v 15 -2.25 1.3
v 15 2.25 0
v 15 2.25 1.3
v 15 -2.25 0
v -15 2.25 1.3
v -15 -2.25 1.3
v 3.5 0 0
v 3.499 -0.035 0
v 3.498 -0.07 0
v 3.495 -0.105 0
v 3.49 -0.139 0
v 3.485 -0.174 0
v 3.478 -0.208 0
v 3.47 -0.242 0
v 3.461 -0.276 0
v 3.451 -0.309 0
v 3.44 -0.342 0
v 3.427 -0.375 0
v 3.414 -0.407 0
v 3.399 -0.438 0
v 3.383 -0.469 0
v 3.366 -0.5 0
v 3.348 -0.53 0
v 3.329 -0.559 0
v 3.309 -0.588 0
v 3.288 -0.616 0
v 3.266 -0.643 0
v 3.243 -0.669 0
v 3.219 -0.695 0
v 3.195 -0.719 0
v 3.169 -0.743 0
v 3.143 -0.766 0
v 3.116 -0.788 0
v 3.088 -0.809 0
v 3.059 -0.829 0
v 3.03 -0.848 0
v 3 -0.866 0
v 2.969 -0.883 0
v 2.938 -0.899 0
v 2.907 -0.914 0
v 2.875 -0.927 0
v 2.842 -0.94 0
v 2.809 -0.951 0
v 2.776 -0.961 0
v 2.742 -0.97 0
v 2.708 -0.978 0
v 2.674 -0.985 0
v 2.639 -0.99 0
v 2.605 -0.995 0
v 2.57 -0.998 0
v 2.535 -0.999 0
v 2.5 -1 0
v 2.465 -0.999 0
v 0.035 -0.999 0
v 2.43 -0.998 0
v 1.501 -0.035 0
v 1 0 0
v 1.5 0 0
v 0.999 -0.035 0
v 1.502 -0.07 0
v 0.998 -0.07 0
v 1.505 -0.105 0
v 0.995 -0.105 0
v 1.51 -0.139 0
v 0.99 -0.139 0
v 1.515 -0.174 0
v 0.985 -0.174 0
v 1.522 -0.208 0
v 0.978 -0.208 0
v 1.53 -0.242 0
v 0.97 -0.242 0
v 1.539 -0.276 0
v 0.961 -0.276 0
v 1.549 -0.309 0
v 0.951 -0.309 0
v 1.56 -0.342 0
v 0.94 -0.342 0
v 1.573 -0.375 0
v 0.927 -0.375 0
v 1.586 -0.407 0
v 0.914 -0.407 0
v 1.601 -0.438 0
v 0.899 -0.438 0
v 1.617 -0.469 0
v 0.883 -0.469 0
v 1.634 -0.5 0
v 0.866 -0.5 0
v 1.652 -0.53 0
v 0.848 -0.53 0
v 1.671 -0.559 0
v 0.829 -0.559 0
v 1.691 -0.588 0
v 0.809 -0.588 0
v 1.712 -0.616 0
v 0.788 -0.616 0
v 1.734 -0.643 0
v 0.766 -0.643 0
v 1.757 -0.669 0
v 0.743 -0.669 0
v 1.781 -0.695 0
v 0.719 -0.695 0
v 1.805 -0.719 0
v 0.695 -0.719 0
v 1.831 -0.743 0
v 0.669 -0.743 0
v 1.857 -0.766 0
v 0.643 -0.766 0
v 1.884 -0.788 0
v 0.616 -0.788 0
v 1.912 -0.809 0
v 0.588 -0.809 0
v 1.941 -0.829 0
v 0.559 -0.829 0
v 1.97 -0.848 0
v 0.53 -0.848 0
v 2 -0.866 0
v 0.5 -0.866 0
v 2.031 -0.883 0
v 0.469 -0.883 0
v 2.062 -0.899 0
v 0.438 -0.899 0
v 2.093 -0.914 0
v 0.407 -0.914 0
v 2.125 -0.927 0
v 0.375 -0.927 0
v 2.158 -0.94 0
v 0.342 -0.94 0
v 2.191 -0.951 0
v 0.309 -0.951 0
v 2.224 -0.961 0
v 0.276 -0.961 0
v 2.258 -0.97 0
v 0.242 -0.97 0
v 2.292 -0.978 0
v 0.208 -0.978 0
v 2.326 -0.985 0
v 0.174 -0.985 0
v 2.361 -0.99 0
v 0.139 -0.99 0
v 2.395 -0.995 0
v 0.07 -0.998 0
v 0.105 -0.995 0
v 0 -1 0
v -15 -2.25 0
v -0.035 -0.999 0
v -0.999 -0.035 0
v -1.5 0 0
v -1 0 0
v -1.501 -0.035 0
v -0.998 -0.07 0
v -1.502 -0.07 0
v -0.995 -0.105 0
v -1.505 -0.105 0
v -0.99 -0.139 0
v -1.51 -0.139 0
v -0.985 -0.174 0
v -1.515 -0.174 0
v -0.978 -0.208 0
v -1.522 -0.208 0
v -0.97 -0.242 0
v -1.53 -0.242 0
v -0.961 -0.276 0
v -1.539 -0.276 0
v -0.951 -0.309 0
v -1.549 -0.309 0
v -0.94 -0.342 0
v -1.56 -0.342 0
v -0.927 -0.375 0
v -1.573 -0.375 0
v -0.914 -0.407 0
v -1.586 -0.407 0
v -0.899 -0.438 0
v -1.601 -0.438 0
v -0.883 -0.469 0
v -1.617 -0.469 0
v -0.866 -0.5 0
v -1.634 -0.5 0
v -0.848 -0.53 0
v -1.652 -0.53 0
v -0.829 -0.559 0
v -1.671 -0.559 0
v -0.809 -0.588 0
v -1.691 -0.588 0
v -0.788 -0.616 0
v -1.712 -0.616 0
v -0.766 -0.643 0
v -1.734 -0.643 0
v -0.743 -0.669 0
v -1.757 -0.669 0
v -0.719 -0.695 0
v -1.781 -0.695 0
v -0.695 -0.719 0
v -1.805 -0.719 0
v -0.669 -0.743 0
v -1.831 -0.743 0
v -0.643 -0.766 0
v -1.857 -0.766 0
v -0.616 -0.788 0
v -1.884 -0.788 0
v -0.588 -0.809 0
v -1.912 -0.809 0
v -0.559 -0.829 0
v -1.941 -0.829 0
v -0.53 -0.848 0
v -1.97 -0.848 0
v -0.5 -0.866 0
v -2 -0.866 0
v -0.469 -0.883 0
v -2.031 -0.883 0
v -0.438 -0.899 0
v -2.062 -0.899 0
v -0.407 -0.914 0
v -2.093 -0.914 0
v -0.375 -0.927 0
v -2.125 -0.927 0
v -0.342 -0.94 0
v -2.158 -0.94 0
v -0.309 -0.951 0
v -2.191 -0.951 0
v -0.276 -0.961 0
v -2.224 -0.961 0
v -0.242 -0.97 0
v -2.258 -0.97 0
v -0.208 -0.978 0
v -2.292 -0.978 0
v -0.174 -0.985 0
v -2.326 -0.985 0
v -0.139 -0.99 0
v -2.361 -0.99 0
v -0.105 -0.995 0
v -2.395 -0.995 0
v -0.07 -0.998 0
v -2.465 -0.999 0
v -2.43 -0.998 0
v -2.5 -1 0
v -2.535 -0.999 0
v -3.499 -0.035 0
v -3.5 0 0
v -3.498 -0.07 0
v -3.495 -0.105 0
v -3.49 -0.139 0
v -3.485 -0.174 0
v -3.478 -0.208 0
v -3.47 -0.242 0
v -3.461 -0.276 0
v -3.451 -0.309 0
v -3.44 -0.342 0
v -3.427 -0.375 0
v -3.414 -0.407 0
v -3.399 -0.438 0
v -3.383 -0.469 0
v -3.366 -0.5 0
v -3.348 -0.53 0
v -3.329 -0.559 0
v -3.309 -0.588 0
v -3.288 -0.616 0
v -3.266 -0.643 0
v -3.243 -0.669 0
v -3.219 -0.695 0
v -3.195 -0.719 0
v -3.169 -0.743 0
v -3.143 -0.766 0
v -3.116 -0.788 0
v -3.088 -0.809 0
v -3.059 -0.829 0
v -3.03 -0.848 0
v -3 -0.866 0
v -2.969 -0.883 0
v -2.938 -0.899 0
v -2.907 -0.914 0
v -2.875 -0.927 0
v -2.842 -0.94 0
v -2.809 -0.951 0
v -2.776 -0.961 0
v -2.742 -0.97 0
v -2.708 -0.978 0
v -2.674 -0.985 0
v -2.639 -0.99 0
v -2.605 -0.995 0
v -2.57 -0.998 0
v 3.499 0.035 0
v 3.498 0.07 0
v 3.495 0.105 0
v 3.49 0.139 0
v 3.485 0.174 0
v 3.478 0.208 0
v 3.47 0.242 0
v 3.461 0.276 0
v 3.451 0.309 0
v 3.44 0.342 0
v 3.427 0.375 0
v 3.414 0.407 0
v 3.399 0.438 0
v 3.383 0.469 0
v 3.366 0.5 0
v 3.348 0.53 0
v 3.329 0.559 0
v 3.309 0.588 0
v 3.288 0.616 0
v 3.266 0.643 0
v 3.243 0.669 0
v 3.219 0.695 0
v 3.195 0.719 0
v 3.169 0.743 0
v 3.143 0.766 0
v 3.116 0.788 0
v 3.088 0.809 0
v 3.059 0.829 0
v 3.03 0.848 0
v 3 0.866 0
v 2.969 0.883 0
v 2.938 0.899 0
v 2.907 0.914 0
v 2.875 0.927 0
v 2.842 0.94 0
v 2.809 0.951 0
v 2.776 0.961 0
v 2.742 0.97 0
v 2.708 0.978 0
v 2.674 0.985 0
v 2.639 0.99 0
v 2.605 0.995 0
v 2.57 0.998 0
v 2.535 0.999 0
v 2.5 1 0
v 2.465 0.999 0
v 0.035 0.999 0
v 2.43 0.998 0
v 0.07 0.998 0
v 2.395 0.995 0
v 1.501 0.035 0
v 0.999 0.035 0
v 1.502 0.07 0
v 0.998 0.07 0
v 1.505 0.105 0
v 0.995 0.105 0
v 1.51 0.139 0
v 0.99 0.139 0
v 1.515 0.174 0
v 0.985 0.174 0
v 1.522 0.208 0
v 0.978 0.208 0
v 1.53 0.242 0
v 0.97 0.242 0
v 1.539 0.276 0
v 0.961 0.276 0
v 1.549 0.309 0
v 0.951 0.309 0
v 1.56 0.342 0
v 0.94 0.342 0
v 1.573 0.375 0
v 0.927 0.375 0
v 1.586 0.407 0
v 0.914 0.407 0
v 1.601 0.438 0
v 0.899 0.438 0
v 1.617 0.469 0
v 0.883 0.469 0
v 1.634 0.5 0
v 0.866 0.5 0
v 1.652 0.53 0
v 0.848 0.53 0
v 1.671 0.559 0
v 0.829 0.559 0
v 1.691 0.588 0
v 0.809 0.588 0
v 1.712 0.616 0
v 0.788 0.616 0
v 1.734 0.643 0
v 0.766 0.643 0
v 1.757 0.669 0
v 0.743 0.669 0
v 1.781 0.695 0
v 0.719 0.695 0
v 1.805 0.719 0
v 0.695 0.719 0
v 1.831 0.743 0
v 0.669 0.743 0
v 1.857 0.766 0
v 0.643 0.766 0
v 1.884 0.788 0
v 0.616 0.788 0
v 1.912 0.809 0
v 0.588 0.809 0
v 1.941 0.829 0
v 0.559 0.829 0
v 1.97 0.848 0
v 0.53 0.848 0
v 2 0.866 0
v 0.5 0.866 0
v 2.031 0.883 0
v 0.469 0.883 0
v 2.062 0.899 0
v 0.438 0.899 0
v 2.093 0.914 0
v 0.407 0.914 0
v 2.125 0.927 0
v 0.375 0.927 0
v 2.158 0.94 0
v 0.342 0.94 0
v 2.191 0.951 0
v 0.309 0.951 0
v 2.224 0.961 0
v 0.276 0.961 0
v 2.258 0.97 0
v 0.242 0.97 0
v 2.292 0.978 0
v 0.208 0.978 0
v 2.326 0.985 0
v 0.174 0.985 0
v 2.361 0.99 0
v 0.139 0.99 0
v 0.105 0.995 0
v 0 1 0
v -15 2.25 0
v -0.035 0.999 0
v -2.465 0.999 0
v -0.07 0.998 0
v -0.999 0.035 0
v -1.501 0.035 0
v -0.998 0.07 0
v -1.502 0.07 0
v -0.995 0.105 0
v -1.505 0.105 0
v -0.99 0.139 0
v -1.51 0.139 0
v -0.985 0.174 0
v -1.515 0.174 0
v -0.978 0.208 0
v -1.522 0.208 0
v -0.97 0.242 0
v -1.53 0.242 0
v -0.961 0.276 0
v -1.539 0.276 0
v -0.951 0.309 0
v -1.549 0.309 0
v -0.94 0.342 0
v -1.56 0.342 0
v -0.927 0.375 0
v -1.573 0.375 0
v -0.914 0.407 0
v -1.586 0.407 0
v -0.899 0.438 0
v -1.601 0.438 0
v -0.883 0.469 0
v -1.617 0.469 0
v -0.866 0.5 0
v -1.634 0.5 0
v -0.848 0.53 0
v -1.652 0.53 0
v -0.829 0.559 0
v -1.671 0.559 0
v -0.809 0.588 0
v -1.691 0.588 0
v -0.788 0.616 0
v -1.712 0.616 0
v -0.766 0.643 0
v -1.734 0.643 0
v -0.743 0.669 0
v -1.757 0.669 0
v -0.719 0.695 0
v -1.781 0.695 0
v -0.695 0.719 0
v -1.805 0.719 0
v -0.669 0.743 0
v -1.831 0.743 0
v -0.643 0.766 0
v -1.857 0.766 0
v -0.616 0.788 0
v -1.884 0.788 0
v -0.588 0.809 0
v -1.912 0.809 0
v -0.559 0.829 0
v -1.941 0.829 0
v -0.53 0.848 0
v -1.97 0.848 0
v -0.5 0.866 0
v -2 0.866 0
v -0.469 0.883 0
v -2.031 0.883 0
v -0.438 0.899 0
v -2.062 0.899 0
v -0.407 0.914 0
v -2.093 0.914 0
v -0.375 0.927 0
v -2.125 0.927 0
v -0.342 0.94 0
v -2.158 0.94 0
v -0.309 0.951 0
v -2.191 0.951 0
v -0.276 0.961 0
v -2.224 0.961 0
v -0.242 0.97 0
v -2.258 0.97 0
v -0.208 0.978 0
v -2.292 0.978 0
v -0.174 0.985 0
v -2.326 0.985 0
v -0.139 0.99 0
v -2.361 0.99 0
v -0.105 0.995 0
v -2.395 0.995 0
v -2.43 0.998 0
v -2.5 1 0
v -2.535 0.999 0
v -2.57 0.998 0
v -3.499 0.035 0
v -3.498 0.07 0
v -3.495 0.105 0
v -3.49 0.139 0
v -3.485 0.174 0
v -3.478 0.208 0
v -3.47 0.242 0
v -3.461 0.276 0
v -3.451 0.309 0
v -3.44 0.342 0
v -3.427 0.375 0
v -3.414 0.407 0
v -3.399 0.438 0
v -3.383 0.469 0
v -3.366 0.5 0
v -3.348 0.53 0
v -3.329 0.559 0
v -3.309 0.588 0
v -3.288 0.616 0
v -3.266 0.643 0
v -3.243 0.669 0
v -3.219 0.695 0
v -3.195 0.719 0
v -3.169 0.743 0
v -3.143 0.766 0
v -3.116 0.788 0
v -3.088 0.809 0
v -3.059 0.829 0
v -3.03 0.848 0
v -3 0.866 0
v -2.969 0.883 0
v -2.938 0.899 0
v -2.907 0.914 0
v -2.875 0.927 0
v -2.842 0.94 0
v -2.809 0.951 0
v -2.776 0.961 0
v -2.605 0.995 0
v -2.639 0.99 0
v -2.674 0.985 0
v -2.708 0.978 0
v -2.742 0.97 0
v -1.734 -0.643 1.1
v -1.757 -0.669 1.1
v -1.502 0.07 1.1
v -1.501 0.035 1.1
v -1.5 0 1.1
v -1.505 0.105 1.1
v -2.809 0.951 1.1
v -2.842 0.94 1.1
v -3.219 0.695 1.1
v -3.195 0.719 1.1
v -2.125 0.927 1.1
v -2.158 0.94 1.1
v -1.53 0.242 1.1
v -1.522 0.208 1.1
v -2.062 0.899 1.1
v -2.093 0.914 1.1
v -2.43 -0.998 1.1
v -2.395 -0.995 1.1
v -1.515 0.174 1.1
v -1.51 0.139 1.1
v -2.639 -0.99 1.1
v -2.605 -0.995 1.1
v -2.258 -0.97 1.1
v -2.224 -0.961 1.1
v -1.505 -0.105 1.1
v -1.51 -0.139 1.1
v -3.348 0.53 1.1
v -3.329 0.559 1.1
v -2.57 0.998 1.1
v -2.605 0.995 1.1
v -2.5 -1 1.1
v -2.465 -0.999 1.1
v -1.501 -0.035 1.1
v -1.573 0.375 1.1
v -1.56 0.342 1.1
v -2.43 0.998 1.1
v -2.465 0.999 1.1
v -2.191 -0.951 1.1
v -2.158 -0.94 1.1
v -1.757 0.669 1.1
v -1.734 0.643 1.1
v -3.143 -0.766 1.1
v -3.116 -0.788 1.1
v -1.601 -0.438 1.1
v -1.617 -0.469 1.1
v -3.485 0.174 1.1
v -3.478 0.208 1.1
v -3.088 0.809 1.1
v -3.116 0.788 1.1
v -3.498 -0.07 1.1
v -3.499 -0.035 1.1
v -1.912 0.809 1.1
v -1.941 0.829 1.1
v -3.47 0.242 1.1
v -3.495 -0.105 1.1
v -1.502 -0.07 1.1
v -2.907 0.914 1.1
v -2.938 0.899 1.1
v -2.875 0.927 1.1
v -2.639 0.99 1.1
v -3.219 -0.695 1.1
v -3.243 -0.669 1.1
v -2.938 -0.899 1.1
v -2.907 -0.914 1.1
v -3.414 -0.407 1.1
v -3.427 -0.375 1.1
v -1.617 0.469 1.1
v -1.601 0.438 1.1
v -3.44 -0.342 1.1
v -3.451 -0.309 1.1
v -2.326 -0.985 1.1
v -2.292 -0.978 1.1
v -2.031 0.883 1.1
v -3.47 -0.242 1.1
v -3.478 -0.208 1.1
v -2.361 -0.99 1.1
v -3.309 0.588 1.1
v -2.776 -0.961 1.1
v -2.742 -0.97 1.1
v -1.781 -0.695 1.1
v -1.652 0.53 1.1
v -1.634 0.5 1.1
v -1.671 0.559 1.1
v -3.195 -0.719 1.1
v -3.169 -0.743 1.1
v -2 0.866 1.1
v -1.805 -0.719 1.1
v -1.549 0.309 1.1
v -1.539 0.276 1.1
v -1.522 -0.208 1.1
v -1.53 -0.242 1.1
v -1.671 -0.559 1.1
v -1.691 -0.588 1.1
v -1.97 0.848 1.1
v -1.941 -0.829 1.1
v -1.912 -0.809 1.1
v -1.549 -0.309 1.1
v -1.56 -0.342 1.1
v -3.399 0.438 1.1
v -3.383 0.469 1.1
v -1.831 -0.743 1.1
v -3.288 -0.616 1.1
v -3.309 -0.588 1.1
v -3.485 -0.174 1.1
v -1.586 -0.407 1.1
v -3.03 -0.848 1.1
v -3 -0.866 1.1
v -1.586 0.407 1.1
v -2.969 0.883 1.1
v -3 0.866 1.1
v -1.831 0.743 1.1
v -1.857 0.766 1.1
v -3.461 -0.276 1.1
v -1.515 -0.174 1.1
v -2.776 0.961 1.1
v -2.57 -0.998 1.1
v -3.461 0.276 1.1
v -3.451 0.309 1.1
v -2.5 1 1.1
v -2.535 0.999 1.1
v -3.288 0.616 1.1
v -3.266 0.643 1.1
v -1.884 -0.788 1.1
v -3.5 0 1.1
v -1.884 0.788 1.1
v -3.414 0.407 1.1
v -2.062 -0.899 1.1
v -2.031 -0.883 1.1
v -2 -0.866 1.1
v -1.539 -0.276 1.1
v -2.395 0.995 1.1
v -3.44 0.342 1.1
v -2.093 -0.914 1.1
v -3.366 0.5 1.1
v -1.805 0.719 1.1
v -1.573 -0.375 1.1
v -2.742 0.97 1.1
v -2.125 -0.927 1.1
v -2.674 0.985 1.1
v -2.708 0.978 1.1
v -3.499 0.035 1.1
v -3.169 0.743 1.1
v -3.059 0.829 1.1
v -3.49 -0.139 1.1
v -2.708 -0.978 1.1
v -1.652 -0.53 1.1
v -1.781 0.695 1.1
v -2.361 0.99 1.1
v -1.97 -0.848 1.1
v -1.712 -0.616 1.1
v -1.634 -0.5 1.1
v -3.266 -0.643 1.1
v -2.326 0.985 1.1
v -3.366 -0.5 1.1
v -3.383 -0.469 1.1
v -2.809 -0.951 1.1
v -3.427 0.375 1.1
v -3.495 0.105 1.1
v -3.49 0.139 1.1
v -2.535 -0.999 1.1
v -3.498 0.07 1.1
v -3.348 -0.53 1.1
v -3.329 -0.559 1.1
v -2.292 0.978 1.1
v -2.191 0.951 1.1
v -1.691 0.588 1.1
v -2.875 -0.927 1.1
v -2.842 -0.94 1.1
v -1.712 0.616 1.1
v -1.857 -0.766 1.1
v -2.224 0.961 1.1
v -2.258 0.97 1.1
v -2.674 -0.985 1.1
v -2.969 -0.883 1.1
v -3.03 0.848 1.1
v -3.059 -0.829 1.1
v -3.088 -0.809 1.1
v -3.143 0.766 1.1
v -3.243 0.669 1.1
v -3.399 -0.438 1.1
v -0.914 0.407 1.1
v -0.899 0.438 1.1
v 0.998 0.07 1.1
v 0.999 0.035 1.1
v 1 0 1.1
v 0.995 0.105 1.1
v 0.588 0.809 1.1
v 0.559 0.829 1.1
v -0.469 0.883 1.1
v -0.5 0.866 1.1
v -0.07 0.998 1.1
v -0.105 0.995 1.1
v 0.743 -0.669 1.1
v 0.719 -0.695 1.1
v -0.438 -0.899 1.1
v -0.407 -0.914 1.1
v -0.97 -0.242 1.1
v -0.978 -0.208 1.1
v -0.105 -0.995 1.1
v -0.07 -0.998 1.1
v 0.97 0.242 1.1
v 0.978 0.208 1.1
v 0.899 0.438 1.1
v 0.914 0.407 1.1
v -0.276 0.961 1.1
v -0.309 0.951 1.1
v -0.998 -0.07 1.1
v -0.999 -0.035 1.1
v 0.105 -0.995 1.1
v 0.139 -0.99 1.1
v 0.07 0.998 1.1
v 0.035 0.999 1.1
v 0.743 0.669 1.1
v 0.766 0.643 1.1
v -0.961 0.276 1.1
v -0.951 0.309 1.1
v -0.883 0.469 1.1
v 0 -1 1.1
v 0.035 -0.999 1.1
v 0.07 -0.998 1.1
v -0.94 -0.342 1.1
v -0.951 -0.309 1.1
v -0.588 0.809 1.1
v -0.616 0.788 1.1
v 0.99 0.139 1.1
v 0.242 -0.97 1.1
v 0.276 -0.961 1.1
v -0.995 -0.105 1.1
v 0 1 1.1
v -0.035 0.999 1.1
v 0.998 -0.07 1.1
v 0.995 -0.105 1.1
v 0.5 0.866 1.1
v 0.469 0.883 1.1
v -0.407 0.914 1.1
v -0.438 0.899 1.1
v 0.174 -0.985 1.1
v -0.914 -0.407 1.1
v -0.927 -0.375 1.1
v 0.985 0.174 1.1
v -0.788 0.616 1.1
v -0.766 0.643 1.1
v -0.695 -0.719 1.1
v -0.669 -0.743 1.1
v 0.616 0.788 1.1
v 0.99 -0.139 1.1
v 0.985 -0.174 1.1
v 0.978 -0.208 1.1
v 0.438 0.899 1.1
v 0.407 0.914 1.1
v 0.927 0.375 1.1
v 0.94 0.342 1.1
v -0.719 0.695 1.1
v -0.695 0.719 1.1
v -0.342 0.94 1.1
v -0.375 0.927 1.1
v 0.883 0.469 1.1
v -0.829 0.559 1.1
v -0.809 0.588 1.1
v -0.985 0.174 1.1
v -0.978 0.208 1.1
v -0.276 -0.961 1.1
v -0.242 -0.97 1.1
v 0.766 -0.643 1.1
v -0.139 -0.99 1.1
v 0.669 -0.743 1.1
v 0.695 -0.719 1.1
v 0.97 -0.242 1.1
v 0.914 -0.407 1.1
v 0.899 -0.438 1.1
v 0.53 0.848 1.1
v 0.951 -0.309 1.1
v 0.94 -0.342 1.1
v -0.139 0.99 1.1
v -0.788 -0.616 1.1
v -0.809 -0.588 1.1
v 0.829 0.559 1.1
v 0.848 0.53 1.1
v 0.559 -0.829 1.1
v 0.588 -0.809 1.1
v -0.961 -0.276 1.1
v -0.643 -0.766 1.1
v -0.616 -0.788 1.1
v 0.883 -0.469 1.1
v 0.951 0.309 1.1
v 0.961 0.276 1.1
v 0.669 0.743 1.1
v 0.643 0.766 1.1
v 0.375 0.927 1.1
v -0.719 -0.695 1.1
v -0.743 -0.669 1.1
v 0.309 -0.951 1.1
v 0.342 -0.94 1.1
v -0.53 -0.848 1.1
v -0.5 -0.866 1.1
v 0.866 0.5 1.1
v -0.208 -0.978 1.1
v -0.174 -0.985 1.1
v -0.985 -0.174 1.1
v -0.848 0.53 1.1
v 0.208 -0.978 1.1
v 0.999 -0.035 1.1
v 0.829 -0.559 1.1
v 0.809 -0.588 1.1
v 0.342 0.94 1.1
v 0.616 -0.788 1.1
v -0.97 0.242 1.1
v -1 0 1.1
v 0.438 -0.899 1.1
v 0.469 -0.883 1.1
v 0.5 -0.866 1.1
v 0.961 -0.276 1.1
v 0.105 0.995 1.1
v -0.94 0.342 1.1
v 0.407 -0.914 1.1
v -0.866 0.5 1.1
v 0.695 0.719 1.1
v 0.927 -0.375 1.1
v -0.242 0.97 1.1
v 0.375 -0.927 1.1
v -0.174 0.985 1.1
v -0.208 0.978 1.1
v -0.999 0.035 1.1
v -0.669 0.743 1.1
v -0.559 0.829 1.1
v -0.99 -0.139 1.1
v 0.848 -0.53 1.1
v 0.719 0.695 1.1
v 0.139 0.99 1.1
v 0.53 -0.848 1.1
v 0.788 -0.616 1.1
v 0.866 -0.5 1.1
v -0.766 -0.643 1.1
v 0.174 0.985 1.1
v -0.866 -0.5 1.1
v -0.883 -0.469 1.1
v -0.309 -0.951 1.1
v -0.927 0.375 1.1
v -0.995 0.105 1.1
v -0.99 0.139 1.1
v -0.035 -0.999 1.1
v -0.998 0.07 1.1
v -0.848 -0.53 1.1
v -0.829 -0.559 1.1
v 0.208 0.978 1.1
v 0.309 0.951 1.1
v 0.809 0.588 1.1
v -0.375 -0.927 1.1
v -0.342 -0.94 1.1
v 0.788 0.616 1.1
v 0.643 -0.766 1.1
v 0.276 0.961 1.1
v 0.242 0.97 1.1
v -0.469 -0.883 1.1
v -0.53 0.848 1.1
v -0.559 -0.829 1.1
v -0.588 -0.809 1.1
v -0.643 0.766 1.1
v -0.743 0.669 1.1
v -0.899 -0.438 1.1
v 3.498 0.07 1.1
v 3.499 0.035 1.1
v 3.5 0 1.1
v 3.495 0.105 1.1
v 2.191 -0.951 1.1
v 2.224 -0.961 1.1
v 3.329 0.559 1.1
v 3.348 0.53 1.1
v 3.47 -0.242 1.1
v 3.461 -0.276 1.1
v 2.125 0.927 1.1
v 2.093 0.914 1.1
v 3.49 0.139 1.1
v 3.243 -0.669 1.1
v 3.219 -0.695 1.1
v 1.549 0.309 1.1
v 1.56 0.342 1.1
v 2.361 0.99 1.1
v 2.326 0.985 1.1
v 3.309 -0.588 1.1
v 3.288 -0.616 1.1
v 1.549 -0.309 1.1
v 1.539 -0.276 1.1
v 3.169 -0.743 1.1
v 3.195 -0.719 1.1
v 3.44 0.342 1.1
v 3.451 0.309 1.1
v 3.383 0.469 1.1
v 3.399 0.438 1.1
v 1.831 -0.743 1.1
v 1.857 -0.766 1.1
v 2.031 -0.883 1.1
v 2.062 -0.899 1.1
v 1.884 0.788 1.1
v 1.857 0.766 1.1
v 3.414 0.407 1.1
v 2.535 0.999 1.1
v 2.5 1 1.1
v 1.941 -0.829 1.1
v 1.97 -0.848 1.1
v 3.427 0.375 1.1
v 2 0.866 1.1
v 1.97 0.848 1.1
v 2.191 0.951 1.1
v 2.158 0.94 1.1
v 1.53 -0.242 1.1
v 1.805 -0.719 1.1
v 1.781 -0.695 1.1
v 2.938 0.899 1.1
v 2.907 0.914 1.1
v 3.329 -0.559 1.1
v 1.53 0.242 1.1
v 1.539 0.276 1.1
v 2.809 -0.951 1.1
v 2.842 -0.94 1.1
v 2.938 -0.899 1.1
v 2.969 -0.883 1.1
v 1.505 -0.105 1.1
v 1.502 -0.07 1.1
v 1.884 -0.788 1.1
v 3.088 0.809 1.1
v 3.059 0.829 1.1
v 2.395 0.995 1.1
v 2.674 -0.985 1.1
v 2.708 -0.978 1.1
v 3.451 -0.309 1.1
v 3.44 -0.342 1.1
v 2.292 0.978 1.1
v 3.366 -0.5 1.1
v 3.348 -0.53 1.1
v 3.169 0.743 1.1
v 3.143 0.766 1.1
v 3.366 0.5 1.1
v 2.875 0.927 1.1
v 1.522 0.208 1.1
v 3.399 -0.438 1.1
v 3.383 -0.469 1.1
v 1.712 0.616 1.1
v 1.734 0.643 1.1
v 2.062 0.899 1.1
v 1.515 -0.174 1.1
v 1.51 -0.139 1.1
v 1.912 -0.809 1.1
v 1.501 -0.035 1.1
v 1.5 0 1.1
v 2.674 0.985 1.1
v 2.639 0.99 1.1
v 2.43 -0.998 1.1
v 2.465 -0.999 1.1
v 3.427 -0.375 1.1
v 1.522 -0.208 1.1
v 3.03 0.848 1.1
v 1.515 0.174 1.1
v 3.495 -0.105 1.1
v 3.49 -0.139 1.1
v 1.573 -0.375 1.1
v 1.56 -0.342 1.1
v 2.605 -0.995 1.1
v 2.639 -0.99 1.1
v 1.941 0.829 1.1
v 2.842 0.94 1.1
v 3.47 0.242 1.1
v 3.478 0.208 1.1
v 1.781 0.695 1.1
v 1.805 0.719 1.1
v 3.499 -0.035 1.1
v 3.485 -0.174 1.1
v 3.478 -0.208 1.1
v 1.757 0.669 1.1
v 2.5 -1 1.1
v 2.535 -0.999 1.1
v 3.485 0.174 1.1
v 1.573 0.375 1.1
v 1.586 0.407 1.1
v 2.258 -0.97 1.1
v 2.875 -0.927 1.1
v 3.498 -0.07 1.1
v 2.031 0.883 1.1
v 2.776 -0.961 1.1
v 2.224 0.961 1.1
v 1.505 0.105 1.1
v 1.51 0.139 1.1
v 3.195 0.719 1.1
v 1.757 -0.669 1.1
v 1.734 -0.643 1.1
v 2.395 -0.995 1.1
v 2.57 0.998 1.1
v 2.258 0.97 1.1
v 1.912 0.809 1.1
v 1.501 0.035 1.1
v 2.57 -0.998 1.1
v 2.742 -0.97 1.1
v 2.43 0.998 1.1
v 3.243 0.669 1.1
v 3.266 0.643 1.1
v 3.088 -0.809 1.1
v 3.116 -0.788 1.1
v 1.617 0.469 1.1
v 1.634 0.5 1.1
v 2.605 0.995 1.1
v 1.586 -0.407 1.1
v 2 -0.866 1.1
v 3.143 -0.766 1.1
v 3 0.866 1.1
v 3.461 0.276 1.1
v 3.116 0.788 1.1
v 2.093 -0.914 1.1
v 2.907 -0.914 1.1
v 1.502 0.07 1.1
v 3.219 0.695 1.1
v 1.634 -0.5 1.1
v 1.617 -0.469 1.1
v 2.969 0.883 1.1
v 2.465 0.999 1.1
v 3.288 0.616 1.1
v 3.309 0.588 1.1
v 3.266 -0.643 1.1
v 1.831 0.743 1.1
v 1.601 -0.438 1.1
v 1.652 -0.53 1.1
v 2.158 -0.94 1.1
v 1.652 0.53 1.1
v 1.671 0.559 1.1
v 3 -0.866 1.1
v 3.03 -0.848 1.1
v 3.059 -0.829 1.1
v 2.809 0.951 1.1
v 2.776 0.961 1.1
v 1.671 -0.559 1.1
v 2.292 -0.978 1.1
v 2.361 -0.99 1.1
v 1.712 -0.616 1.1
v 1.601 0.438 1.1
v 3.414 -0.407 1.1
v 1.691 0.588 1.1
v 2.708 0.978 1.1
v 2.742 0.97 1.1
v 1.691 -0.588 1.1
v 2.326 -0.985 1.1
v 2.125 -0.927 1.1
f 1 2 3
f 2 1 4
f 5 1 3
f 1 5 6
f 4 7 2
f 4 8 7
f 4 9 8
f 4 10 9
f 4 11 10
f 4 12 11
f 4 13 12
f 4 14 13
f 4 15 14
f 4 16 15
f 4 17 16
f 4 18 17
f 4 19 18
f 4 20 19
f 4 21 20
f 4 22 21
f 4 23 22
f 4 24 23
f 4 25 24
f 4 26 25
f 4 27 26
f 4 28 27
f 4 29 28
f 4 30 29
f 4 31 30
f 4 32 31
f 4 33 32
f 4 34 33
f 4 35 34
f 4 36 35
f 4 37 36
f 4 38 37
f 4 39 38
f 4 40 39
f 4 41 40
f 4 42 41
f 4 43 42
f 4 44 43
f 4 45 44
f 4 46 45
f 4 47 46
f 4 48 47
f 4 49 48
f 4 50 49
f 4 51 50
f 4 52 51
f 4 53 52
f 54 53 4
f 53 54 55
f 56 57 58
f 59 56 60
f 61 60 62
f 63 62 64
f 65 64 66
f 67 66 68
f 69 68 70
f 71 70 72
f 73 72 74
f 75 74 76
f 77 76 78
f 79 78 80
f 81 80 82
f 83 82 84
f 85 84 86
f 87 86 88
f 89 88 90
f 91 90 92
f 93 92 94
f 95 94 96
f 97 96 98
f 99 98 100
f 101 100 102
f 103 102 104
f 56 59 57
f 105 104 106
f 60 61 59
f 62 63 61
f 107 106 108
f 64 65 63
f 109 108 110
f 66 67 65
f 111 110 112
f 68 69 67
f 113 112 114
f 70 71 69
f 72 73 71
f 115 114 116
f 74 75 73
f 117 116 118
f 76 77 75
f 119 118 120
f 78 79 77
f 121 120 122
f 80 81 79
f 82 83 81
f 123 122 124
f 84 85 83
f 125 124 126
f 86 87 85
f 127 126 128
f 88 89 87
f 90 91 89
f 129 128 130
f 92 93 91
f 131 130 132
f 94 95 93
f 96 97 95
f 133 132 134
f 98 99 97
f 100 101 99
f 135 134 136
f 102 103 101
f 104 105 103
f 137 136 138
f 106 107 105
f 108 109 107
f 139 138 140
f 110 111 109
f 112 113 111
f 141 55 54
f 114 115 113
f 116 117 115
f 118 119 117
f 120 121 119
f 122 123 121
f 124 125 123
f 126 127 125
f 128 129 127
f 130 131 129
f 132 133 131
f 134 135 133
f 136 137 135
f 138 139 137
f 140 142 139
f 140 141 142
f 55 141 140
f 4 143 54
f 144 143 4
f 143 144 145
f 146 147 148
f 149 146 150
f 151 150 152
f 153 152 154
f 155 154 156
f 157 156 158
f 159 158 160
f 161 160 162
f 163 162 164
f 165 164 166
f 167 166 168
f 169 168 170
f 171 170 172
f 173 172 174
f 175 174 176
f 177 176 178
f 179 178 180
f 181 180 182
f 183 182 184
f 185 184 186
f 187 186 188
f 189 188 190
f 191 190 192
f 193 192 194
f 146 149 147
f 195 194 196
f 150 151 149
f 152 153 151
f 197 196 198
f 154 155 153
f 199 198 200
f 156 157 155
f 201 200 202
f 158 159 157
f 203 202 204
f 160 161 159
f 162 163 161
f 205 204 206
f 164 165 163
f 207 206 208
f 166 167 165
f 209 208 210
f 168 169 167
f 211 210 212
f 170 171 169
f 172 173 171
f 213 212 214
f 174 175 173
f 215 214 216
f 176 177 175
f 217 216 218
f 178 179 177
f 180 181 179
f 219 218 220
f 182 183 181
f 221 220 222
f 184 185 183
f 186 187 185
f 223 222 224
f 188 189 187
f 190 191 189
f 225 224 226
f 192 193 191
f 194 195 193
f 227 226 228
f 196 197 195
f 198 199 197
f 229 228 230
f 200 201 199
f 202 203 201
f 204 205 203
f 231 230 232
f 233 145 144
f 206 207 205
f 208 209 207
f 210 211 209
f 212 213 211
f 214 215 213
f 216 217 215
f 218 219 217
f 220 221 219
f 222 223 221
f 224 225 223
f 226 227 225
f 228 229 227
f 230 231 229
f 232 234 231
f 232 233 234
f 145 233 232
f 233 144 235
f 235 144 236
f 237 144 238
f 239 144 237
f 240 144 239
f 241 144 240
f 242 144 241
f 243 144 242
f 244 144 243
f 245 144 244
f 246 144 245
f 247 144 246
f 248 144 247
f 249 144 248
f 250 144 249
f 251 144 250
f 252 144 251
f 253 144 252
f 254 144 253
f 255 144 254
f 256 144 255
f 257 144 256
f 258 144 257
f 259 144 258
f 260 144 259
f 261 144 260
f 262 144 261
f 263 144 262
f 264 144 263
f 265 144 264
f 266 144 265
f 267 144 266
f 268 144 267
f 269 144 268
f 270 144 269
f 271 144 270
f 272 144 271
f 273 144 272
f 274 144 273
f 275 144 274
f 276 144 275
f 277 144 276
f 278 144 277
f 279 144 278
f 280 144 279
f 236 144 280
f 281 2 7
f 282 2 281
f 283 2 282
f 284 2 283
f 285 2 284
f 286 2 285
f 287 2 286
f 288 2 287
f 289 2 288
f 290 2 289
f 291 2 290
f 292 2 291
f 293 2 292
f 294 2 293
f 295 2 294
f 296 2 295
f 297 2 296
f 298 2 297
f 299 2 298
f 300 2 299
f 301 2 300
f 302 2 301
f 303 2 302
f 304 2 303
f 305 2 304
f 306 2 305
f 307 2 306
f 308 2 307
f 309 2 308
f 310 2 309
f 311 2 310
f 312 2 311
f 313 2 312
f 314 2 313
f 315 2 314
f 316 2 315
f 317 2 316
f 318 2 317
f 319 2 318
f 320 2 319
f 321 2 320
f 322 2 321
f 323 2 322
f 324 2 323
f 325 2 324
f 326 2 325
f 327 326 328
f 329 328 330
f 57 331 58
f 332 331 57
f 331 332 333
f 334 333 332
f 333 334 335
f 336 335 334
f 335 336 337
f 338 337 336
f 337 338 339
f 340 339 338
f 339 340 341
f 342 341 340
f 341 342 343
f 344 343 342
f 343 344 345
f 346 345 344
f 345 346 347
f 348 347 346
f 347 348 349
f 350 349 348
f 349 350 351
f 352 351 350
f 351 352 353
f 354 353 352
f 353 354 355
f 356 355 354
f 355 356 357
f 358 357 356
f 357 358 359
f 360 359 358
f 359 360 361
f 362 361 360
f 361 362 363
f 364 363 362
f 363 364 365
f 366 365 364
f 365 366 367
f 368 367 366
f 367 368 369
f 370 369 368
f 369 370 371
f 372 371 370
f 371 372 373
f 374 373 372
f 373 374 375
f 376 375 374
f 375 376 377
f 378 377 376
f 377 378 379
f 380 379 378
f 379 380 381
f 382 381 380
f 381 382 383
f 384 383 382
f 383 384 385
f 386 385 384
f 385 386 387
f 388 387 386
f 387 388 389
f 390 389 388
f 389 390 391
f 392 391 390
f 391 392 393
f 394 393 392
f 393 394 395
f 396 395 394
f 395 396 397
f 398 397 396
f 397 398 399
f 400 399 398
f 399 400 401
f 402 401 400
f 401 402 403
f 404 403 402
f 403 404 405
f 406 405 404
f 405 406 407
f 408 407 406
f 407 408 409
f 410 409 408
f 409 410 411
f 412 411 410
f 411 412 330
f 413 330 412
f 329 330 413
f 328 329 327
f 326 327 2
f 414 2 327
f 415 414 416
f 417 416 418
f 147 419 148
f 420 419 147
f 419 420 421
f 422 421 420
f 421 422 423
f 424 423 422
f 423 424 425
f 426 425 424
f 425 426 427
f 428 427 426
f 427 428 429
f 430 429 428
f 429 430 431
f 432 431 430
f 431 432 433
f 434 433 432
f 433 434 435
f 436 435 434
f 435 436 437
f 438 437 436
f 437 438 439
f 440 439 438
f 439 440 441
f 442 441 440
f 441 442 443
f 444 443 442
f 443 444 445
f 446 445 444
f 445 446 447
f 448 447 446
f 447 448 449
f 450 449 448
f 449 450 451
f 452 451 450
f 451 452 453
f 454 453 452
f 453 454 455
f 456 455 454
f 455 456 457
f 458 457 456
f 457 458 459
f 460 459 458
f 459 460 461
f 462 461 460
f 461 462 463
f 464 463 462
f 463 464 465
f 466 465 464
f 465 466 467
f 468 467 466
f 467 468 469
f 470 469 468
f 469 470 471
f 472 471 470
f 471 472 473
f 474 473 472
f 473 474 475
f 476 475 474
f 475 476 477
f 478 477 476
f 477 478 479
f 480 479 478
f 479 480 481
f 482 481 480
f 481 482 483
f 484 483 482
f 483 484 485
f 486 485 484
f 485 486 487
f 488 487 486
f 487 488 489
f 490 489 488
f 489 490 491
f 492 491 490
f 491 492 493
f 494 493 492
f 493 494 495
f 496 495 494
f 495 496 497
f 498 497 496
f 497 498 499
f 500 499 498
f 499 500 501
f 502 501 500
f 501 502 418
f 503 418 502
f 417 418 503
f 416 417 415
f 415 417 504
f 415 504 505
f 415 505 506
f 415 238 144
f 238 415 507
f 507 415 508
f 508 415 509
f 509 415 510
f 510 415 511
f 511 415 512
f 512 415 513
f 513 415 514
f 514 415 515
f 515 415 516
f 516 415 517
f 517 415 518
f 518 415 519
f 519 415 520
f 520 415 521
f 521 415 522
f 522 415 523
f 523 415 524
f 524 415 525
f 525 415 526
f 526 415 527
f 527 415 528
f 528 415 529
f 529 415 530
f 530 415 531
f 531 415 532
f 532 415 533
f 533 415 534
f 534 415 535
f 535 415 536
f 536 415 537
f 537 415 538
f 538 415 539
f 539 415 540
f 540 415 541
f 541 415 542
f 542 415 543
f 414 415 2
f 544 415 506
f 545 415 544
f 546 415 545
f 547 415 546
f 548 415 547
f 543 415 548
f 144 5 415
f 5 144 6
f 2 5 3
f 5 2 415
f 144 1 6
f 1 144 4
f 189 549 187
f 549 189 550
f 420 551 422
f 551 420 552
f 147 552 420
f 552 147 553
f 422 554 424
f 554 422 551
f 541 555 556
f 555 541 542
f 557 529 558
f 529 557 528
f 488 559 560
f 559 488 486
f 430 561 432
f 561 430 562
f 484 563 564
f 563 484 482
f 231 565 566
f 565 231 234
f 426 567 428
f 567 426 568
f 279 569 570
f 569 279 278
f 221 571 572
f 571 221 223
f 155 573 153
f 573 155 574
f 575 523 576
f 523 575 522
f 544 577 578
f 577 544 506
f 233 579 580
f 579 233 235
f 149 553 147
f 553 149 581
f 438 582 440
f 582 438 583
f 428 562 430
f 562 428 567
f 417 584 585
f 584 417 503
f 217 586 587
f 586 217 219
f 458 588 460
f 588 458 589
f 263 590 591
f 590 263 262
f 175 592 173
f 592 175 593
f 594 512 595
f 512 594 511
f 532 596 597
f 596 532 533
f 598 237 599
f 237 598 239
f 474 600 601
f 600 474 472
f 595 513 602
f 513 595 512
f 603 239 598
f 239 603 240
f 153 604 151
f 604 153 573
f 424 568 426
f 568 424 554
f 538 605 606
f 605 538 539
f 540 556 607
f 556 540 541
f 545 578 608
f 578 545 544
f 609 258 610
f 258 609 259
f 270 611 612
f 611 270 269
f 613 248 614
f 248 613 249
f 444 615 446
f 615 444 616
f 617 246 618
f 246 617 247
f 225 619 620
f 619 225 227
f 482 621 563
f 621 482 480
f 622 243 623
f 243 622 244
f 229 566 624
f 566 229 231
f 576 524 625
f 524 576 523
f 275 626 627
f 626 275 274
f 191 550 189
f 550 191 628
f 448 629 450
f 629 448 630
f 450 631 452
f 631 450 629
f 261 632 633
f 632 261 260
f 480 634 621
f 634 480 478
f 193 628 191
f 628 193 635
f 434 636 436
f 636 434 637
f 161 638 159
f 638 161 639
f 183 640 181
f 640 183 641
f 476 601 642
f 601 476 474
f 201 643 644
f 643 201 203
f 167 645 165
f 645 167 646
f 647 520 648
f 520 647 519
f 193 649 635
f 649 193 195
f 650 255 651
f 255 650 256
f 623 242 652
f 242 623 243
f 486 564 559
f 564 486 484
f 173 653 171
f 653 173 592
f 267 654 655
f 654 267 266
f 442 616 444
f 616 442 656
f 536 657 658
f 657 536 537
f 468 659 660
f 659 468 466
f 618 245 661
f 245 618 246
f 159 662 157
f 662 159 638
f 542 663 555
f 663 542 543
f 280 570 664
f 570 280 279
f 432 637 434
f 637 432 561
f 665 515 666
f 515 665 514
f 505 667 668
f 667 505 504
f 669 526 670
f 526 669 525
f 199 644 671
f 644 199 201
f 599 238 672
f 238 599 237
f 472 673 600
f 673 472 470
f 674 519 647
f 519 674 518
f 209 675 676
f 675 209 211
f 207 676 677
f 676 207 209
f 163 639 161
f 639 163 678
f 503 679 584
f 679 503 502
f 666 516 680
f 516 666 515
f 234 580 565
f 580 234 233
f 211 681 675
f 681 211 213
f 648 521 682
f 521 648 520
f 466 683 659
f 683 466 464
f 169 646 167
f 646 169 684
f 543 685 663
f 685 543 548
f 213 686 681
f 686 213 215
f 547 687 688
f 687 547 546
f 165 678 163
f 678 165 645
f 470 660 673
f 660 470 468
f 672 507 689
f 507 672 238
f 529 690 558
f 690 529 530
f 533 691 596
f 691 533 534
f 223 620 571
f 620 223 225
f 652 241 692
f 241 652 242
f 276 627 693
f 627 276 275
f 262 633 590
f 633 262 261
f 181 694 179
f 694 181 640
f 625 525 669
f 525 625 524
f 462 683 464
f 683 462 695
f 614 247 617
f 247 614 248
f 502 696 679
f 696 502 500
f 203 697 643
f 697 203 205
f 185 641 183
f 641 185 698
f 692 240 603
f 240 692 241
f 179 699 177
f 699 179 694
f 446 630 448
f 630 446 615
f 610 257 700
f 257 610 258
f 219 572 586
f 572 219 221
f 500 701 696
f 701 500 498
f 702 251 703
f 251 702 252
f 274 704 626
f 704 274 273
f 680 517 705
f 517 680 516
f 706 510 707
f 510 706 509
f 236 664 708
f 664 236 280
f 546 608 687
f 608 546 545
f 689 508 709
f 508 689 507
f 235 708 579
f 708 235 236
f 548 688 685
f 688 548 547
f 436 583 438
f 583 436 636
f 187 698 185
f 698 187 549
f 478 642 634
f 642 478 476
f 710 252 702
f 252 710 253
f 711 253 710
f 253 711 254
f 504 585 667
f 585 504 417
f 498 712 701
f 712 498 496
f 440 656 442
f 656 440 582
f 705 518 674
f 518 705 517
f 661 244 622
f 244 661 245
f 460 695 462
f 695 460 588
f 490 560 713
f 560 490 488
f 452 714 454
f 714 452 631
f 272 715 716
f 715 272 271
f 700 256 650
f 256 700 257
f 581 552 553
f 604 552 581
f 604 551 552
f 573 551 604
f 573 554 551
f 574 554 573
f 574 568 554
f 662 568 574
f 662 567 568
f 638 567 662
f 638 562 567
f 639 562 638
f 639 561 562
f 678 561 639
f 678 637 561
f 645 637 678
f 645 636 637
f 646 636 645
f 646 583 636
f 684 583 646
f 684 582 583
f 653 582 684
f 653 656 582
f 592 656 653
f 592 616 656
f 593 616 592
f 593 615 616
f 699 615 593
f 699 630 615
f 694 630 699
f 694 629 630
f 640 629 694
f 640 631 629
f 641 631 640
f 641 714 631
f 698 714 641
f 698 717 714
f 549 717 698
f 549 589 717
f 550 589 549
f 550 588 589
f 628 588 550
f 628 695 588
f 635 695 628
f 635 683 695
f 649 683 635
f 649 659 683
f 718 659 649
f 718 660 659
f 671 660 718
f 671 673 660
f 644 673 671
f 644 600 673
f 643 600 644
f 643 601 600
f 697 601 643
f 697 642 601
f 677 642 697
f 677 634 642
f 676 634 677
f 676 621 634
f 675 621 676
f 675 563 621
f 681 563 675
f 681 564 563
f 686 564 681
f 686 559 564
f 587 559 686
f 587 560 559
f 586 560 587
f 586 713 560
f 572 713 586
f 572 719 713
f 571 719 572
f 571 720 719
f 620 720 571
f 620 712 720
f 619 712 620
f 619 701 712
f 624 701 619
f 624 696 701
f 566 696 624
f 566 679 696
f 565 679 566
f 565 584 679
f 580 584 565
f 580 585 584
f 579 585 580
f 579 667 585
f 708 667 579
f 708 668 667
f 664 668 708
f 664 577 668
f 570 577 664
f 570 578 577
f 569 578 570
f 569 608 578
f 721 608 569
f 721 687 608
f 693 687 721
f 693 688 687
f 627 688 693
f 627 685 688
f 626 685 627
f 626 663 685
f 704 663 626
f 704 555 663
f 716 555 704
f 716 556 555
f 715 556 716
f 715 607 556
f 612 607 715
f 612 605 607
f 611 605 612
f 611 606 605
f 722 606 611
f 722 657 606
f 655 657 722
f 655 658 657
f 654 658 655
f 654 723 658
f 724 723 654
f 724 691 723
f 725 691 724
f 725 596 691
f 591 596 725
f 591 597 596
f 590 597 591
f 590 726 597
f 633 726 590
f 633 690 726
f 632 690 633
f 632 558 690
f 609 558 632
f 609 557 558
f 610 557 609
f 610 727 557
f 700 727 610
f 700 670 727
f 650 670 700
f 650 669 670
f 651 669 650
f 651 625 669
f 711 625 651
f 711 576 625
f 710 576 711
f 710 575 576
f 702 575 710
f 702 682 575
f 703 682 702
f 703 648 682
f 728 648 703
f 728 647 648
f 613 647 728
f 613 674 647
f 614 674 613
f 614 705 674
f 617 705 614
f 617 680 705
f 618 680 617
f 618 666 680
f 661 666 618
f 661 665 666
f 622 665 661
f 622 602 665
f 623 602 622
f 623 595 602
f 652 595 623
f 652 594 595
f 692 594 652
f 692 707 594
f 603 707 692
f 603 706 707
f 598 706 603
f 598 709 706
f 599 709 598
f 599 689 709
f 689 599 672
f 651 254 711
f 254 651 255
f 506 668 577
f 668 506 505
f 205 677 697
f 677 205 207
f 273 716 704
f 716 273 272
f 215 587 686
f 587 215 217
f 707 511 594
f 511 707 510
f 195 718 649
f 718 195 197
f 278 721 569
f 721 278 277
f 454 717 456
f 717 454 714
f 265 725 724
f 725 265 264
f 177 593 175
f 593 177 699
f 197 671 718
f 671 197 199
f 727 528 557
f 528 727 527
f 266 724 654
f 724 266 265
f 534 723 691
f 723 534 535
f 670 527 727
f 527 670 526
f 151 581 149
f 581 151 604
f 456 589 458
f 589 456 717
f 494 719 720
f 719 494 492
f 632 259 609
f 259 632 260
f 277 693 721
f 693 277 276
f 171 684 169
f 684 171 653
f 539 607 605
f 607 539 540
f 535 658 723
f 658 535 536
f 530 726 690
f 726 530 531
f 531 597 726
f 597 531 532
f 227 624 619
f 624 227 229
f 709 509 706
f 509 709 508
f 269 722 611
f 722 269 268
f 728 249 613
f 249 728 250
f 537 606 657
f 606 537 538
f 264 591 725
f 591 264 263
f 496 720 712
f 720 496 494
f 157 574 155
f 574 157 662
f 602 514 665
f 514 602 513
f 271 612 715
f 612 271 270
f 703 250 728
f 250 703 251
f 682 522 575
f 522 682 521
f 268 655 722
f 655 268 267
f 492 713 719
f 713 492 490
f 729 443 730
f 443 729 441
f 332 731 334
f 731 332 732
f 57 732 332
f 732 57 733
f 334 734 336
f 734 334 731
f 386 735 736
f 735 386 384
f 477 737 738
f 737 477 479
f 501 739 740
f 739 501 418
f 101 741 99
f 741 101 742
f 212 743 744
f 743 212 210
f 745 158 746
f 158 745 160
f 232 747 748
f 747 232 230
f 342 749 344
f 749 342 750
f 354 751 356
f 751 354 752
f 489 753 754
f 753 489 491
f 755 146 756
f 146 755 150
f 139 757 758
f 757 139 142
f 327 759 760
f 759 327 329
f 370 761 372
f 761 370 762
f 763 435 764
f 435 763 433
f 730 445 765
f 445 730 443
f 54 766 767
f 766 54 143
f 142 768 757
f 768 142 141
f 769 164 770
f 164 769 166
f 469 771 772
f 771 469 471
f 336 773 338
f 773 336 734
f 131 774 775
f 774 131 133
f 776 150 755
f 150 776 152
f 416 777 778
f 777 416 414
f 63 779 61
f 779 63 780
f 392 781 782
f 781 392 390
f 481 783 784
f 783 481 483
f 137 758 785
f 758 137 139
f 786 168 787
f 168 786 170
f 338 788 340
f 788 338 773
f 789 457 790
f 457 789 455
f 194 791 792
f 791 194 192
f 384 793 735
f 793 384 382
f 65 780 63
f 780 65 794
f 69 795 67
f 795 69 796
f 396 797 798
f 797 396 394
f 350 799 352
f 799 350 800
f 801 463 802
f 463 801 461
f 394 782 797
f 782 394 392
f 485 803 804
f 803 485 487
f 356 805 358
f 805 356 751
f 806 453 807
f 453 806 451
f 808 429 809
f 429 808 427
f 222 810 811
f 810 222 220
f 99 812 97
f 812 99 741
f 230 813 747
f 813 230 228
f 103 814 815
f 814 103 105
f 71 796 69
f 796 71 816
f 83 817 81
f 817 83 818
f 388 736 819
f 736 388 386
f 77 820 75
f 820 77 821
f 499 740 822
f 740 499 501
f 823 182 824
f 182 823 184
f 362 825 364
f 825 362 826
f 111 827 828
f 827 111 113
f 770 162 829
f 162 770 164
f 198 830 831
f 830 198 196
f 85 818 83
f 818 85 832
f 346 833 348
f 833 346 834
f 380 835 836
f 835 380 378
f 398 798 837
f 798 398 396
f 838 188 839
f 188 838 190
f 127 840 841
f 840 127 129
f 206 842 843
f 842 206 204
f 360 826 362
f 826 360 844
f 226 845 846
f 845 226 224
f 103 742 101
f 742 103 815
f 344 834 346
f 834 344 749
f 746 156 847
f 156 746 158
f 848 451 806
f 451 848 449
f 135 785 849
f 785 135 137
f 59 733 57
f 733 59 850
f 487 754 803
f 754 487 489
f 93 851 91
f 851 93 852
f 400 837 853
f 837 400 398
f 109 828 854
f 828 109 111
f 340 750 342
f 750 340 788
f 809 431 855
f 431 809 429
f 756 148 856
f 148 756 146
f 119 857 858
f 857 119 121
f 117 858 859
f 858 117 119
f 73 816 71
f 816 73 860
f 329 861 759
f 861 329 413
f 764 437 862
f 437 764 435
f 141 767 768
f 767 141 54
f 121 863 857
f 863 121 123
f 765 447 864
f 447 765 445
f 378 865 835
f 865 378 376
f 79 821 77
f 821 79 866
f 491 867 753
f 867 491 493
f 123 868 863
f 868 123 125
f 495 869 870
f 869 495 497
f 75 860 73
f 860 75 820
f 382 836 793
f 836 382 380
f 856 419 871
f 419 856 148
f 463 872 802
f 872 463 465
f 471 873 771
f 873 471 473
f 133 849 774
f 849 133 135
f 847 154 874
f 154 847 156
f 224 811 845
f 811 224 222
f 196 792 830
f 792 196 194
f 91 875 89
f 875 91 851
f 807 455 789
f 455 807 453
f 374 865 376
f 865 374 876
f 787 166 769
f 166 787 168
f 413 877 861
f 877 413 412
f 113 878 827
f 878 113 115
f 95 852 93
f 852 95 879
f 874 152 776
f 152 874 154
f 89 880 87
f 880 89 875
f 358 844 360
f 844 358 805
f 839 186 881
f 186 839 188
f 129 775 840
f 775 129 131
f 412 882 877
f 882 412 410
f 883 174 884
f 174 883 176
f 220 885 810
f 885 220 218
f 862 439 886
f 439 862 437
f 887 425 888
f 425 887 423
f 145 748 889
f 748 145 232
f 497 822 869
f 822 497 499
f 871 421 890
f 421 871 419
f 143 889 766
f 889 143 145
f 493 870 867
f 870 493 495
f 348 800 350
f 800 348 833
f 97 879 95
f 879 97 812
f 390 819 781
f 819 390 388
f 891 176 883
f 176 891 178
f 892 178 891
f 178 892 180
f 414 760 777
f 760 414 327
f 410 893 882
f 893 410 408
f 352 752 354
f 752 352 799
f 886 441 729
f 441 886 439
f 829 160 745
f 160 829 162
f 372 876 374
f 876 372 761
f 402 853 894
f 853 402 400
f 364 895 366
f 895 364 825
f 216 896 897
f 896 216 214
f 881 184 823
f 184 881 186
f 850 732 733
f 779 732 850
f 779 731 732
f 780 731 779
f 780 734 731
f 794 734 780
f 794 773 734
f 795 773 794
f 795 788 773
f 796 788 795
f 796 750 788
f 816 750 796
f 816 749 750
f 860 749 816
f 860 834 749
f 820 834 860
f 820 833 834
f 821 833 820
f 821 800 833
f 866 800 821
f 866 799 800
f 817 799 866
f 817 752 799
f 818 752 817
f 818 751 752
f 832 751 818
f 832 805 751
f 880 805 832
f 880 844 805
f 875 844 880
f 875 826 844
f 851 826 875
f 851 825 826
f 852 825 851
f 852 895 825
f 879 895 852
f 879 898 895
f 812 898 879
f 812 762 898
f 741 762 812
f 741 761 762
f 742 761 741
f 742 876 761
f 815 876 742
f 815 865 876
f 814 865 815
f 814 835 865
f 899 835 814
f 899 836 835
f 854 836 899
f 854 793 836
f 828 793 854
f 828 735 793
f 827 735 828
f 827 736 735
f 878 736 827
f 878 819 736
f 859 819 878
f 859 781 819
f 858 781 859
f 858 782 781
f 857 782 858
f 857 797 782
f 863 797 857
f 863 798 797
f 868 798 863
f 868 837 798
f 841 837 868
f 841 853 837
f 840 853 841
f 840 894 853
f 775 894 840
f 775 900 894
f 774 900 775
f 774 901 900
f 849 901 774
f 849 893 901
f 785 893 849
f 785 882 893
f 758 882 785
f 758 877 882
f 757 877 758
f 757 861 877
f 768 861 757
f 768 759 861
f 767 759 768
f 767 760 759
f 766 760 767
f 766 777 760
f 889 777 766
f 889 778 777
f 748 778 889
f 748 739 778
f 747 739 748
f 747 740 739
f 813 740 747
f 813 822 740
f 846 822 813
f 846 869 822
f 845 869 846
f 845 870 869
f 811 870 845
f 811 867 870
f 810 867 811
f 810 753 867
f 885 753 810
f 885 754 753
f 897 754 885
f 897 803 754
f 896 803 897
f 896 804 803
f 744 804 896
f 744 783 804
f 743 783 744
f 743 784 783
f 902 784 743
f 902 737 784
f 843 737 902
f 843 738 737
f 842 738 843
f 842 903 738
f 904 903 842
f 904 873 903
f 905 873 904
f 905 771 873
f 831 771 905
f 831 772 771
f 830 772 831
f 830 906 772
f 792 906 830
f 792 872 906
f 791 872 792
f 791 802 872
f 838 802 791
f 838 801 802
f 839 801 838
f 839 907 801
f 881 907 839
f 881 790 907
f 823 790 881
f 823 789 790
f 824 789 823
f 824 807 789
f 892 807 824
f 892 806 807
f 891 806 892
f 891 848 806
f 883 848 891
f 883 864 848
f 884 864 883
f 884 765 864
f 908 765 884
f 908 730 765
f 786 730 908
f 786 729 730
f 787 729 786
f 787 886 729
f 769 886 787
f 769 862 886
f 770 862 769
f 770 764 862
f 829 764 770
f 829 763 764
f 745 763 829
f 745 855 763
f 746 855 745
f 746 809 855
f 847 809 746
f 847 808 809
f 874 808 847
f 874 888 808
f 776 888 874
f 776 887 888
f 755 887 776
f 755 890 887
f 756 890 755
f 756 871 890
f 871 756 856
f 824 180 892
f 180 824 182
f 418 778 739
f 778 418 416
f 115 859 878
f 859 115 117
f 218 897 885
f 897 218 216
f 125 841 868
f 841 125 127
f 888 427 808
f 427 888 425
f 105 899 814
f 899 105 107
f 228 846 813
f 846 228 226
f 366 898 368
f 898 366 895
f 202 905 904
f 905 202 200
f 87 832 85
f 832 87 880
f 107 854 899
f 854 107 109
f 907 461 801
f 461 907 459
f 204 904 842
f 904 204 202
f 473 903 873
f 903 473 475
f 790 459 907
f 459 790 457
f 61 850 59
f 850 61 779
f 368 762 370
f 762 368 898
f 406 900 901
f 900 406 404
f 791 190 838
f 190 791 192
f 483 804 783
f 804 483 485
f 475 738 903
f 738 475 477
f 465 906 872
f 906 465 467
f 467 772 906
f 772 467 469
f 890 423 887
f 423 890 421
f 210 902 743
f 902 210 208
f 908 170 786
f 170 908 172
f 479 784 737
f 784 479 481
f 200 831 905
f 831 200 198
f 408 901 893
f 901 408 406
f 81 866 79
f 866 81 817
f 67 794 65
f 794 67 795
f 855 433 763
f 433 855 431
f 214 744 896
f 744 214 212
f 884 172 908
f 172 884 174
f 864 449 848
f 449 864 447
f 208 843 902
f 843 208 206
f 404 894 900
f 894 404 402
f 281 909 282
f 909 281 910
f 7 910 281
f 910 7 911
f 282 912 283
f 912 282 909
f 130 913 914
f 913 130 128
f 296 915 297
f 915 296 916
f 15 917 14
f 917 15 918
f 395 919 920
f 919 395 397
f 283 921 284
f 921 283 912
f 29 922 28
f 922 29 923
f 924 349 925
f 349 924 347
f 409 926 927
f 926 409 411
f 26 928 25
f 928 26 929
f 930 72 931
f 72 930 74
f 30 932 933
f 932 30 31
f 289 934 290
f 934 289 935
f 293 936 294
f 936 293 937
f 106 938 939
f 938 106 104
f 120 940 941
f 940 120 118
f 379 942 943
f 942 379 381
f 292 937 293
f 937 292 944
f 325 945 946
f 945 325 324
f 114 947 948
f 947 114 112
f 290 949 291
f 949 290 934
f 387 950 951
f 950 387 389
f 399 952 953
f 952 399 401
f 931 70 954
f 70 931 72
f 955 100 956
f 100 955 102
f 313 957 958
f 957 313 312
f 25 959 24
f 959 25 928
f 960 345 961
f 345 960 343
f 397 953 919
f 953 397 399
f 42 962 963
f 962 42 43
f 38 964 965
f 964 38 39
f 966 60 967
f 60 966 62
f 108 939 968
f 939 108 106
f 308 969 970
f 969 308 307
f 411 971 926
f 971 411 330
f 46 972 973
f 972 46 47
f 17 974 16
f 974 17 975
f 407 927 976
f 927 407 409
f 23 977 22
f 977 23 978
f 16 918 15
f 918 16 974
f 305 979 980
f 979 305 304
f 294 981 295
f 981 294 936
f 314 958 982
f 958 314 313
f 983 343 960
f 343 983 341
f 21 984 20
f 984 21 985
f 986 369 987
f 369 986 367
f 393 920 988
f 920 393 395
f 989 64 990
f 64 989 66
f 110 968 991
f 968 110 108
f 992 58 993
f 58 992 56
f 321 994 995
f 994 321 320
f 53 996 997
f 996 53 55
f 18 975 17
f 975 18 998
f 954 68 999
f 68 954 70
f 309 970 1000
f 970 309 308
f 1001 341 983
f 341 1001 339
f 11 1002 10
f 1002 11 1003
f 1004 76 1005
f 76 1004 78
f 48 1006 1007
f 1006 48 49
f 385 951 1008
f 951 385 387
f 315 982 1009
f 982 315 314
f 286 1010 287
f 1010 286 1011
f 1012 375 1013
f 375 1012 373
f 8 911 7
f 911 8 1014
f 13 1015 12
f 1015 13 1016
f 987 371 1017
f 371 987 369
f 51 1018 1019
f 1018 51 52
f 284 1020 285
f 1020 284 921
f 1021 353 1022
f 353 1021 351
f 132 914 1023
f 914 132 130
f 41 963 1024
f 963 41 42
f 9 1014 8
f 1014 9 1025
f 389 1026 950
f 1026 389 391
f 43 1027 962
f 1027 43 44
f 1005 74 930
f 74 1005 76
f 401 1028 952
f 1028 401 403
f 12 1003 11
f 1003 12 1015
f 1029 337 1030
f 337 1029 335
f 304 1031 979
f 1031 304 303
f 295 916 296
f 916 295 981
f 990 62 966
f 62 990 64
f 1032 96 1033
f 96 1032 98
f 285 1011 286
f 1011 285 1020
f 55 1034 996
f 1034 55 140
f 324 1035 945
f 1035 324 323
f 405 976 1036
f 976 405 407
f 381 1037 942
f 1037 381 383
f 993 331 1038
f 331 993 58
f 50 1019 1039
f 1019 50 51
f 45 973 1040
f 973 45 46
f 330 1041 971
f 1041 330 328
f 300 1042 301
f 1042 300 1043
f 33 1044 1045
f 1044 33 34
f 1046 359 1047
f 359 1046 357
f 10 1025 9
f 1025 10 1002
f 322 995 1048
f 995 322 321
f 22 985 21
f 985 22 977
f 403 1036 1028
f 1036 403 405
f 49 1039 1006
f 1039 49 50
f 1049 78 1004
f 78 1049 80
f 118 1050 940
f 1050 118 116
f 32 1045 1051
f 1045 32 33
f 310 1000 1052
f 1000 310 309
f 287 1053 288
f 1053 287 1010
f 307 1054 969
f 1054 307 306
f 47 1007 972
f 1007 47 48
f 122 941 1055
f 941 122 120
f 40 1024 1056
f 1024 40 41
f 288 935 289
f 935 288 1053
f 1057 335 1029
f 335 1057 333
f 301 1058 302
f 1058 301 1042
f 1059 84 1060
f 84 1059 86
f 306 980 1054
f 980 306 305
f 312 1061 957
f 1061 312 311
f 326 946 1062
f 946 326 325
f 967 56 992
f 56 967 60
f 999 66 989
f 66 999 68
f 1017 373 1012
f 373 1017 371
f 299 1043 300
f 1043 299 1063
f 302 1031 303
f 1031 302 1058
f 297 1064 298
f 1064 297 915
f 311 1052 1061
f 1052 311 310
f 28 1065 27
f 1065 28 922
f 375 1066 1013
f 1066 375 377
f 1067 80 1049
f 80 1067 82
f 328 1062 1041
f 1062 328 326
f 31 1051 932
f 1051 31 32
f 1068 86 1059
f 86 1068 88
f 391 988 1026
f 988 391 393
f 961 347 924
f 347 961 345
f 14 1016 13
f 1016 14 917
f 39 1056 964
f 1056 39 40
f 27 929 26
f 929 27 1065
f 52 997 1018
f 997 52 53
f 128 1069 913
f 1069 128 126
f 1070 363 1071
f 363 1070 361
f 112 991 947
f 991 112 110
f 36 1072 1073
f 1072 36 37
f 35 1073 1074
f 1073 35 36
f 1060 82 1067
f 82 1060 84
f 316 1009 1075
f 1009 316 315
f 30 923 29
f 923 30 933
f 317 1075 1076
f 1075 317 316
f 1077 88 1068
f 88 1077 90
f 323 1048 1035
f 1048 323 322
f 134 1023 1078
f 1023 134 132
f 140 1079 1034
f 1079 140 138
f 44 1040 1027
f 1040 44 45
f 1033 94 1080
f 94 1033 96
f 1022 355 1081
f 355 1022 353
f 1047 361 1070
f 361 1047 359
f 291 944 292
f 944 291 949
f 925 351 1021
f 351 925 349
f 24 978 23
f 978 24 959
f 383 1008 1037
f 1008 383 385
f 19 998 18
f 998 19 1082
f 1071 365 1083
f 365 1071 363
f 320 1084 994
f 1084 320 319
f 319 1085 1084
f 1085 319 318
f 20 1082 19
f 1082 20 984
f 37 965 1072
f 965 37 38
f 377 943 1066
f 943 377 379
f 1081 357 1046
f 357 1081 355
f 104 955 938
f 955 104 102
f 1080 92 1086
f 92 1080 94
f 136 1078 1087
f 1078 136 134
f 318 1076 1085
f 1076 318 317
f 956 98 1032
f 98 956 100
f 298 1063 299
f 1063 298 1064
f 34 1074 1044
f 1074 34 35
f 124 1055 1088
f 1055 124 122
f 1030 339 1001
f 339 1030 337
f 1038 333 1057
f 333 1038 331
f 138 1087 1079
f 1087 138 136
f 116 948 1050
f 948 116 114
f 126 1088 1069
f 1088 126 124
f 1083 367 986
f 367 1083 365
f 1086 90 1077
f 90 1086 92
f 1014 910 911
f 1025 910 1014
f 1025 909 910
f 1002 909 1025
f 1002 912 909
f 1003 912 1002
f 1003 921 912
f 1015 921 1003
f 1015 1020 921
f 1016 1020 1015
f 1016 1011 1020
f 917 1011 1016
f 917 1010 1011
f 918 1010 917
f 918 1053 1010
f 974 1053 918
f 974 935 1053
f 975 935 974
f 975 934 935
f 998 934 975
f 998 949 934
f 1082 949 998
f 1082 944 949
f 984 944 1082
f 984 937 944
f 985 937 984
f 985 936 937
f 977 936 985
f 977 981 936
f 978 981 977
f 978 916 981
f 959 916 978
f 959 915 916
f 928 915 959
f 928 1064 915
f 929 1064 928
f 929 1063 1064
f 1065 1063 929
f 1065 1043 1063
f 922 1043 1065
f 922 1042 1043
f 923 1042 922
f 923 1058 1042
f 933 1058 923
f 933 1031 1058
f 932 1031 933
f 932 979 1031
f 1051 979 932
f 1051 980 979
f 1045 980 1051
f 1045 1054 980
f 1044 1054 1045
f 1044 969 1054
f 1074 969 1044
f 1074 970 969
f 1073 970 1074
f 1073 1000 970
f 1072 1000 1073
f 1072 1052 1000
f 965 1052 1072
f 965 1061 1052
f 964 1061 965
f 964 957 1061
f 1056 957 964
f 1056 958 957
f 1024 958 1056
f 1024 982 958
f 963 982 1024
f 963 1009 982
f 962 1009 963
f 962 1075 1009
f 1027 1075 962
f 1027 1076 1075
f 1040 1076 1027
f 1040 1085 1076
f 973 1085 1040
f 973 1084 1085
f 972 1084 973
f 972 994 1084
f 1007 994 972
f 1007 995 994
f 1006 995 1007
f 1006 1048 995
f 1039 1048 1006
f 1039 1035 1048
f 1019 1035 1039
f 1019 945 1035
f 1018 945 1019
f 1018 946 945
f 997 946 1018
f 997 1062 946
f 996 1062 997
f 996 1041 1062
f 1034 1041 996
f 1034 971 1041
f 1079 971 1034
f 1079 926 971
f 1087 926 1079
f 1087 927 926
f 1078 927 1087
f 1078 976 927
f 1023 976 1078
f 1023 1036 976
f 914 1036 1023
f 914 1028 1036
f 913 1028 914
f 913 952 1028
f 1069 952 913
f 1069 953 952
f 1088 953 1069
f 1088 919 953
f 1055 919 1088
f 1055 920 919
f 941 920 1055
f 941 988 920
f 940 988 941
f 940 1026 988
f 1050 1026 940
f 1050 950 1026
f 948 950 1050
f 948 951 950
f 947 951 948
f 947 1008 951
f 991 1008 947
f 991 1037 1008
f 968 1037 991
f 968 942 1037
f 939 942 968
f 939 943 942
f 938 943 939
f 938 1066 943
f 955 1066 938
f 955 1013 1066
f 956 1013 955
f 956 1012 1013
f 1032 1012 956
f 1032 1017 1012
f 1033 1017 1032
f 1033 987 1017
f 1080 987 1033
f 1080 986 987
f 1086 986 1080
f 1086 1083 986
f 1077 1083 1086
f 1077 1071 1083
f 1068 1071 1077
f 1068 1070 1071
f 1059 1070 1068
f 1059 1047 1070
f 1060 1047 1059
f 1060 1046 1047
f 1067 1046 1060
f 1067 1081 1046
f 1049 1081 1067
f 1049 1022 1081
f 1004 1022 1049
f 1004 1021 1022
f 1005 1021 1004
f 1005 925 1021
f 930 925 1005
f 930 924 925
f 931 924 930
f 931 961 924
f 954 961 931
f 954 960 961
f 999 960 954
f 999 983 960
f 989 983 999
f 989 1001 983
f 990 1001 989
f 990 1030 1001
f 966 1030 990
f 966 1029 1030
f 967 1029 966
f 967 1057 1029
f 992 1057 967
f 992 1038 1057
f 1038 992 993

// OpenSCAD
MAGNET_SIZE_D = 2;
MAGNET_SIZE_Y = 1;

MAGNET_HOLE_Y = MAGNET_SIZE_Y + 0.1 + 1;

difference() {
    translate([-30/2, -4.5/2]) cube([30, 4.5, 1.3]);
    translate([-2.5, 0, -1]) cylinder(h=MAGNET_HOLE_Y, d=2, $fn=180);
    translate([0, 0, -1]) cylinder(h=MAGNET_HOLE_Y, d=2, $fn=180);
    translate([2.5, 0, -1]) cylinder(h=MAGNET_HOLE_Y, d=2, $fn=180);
}
